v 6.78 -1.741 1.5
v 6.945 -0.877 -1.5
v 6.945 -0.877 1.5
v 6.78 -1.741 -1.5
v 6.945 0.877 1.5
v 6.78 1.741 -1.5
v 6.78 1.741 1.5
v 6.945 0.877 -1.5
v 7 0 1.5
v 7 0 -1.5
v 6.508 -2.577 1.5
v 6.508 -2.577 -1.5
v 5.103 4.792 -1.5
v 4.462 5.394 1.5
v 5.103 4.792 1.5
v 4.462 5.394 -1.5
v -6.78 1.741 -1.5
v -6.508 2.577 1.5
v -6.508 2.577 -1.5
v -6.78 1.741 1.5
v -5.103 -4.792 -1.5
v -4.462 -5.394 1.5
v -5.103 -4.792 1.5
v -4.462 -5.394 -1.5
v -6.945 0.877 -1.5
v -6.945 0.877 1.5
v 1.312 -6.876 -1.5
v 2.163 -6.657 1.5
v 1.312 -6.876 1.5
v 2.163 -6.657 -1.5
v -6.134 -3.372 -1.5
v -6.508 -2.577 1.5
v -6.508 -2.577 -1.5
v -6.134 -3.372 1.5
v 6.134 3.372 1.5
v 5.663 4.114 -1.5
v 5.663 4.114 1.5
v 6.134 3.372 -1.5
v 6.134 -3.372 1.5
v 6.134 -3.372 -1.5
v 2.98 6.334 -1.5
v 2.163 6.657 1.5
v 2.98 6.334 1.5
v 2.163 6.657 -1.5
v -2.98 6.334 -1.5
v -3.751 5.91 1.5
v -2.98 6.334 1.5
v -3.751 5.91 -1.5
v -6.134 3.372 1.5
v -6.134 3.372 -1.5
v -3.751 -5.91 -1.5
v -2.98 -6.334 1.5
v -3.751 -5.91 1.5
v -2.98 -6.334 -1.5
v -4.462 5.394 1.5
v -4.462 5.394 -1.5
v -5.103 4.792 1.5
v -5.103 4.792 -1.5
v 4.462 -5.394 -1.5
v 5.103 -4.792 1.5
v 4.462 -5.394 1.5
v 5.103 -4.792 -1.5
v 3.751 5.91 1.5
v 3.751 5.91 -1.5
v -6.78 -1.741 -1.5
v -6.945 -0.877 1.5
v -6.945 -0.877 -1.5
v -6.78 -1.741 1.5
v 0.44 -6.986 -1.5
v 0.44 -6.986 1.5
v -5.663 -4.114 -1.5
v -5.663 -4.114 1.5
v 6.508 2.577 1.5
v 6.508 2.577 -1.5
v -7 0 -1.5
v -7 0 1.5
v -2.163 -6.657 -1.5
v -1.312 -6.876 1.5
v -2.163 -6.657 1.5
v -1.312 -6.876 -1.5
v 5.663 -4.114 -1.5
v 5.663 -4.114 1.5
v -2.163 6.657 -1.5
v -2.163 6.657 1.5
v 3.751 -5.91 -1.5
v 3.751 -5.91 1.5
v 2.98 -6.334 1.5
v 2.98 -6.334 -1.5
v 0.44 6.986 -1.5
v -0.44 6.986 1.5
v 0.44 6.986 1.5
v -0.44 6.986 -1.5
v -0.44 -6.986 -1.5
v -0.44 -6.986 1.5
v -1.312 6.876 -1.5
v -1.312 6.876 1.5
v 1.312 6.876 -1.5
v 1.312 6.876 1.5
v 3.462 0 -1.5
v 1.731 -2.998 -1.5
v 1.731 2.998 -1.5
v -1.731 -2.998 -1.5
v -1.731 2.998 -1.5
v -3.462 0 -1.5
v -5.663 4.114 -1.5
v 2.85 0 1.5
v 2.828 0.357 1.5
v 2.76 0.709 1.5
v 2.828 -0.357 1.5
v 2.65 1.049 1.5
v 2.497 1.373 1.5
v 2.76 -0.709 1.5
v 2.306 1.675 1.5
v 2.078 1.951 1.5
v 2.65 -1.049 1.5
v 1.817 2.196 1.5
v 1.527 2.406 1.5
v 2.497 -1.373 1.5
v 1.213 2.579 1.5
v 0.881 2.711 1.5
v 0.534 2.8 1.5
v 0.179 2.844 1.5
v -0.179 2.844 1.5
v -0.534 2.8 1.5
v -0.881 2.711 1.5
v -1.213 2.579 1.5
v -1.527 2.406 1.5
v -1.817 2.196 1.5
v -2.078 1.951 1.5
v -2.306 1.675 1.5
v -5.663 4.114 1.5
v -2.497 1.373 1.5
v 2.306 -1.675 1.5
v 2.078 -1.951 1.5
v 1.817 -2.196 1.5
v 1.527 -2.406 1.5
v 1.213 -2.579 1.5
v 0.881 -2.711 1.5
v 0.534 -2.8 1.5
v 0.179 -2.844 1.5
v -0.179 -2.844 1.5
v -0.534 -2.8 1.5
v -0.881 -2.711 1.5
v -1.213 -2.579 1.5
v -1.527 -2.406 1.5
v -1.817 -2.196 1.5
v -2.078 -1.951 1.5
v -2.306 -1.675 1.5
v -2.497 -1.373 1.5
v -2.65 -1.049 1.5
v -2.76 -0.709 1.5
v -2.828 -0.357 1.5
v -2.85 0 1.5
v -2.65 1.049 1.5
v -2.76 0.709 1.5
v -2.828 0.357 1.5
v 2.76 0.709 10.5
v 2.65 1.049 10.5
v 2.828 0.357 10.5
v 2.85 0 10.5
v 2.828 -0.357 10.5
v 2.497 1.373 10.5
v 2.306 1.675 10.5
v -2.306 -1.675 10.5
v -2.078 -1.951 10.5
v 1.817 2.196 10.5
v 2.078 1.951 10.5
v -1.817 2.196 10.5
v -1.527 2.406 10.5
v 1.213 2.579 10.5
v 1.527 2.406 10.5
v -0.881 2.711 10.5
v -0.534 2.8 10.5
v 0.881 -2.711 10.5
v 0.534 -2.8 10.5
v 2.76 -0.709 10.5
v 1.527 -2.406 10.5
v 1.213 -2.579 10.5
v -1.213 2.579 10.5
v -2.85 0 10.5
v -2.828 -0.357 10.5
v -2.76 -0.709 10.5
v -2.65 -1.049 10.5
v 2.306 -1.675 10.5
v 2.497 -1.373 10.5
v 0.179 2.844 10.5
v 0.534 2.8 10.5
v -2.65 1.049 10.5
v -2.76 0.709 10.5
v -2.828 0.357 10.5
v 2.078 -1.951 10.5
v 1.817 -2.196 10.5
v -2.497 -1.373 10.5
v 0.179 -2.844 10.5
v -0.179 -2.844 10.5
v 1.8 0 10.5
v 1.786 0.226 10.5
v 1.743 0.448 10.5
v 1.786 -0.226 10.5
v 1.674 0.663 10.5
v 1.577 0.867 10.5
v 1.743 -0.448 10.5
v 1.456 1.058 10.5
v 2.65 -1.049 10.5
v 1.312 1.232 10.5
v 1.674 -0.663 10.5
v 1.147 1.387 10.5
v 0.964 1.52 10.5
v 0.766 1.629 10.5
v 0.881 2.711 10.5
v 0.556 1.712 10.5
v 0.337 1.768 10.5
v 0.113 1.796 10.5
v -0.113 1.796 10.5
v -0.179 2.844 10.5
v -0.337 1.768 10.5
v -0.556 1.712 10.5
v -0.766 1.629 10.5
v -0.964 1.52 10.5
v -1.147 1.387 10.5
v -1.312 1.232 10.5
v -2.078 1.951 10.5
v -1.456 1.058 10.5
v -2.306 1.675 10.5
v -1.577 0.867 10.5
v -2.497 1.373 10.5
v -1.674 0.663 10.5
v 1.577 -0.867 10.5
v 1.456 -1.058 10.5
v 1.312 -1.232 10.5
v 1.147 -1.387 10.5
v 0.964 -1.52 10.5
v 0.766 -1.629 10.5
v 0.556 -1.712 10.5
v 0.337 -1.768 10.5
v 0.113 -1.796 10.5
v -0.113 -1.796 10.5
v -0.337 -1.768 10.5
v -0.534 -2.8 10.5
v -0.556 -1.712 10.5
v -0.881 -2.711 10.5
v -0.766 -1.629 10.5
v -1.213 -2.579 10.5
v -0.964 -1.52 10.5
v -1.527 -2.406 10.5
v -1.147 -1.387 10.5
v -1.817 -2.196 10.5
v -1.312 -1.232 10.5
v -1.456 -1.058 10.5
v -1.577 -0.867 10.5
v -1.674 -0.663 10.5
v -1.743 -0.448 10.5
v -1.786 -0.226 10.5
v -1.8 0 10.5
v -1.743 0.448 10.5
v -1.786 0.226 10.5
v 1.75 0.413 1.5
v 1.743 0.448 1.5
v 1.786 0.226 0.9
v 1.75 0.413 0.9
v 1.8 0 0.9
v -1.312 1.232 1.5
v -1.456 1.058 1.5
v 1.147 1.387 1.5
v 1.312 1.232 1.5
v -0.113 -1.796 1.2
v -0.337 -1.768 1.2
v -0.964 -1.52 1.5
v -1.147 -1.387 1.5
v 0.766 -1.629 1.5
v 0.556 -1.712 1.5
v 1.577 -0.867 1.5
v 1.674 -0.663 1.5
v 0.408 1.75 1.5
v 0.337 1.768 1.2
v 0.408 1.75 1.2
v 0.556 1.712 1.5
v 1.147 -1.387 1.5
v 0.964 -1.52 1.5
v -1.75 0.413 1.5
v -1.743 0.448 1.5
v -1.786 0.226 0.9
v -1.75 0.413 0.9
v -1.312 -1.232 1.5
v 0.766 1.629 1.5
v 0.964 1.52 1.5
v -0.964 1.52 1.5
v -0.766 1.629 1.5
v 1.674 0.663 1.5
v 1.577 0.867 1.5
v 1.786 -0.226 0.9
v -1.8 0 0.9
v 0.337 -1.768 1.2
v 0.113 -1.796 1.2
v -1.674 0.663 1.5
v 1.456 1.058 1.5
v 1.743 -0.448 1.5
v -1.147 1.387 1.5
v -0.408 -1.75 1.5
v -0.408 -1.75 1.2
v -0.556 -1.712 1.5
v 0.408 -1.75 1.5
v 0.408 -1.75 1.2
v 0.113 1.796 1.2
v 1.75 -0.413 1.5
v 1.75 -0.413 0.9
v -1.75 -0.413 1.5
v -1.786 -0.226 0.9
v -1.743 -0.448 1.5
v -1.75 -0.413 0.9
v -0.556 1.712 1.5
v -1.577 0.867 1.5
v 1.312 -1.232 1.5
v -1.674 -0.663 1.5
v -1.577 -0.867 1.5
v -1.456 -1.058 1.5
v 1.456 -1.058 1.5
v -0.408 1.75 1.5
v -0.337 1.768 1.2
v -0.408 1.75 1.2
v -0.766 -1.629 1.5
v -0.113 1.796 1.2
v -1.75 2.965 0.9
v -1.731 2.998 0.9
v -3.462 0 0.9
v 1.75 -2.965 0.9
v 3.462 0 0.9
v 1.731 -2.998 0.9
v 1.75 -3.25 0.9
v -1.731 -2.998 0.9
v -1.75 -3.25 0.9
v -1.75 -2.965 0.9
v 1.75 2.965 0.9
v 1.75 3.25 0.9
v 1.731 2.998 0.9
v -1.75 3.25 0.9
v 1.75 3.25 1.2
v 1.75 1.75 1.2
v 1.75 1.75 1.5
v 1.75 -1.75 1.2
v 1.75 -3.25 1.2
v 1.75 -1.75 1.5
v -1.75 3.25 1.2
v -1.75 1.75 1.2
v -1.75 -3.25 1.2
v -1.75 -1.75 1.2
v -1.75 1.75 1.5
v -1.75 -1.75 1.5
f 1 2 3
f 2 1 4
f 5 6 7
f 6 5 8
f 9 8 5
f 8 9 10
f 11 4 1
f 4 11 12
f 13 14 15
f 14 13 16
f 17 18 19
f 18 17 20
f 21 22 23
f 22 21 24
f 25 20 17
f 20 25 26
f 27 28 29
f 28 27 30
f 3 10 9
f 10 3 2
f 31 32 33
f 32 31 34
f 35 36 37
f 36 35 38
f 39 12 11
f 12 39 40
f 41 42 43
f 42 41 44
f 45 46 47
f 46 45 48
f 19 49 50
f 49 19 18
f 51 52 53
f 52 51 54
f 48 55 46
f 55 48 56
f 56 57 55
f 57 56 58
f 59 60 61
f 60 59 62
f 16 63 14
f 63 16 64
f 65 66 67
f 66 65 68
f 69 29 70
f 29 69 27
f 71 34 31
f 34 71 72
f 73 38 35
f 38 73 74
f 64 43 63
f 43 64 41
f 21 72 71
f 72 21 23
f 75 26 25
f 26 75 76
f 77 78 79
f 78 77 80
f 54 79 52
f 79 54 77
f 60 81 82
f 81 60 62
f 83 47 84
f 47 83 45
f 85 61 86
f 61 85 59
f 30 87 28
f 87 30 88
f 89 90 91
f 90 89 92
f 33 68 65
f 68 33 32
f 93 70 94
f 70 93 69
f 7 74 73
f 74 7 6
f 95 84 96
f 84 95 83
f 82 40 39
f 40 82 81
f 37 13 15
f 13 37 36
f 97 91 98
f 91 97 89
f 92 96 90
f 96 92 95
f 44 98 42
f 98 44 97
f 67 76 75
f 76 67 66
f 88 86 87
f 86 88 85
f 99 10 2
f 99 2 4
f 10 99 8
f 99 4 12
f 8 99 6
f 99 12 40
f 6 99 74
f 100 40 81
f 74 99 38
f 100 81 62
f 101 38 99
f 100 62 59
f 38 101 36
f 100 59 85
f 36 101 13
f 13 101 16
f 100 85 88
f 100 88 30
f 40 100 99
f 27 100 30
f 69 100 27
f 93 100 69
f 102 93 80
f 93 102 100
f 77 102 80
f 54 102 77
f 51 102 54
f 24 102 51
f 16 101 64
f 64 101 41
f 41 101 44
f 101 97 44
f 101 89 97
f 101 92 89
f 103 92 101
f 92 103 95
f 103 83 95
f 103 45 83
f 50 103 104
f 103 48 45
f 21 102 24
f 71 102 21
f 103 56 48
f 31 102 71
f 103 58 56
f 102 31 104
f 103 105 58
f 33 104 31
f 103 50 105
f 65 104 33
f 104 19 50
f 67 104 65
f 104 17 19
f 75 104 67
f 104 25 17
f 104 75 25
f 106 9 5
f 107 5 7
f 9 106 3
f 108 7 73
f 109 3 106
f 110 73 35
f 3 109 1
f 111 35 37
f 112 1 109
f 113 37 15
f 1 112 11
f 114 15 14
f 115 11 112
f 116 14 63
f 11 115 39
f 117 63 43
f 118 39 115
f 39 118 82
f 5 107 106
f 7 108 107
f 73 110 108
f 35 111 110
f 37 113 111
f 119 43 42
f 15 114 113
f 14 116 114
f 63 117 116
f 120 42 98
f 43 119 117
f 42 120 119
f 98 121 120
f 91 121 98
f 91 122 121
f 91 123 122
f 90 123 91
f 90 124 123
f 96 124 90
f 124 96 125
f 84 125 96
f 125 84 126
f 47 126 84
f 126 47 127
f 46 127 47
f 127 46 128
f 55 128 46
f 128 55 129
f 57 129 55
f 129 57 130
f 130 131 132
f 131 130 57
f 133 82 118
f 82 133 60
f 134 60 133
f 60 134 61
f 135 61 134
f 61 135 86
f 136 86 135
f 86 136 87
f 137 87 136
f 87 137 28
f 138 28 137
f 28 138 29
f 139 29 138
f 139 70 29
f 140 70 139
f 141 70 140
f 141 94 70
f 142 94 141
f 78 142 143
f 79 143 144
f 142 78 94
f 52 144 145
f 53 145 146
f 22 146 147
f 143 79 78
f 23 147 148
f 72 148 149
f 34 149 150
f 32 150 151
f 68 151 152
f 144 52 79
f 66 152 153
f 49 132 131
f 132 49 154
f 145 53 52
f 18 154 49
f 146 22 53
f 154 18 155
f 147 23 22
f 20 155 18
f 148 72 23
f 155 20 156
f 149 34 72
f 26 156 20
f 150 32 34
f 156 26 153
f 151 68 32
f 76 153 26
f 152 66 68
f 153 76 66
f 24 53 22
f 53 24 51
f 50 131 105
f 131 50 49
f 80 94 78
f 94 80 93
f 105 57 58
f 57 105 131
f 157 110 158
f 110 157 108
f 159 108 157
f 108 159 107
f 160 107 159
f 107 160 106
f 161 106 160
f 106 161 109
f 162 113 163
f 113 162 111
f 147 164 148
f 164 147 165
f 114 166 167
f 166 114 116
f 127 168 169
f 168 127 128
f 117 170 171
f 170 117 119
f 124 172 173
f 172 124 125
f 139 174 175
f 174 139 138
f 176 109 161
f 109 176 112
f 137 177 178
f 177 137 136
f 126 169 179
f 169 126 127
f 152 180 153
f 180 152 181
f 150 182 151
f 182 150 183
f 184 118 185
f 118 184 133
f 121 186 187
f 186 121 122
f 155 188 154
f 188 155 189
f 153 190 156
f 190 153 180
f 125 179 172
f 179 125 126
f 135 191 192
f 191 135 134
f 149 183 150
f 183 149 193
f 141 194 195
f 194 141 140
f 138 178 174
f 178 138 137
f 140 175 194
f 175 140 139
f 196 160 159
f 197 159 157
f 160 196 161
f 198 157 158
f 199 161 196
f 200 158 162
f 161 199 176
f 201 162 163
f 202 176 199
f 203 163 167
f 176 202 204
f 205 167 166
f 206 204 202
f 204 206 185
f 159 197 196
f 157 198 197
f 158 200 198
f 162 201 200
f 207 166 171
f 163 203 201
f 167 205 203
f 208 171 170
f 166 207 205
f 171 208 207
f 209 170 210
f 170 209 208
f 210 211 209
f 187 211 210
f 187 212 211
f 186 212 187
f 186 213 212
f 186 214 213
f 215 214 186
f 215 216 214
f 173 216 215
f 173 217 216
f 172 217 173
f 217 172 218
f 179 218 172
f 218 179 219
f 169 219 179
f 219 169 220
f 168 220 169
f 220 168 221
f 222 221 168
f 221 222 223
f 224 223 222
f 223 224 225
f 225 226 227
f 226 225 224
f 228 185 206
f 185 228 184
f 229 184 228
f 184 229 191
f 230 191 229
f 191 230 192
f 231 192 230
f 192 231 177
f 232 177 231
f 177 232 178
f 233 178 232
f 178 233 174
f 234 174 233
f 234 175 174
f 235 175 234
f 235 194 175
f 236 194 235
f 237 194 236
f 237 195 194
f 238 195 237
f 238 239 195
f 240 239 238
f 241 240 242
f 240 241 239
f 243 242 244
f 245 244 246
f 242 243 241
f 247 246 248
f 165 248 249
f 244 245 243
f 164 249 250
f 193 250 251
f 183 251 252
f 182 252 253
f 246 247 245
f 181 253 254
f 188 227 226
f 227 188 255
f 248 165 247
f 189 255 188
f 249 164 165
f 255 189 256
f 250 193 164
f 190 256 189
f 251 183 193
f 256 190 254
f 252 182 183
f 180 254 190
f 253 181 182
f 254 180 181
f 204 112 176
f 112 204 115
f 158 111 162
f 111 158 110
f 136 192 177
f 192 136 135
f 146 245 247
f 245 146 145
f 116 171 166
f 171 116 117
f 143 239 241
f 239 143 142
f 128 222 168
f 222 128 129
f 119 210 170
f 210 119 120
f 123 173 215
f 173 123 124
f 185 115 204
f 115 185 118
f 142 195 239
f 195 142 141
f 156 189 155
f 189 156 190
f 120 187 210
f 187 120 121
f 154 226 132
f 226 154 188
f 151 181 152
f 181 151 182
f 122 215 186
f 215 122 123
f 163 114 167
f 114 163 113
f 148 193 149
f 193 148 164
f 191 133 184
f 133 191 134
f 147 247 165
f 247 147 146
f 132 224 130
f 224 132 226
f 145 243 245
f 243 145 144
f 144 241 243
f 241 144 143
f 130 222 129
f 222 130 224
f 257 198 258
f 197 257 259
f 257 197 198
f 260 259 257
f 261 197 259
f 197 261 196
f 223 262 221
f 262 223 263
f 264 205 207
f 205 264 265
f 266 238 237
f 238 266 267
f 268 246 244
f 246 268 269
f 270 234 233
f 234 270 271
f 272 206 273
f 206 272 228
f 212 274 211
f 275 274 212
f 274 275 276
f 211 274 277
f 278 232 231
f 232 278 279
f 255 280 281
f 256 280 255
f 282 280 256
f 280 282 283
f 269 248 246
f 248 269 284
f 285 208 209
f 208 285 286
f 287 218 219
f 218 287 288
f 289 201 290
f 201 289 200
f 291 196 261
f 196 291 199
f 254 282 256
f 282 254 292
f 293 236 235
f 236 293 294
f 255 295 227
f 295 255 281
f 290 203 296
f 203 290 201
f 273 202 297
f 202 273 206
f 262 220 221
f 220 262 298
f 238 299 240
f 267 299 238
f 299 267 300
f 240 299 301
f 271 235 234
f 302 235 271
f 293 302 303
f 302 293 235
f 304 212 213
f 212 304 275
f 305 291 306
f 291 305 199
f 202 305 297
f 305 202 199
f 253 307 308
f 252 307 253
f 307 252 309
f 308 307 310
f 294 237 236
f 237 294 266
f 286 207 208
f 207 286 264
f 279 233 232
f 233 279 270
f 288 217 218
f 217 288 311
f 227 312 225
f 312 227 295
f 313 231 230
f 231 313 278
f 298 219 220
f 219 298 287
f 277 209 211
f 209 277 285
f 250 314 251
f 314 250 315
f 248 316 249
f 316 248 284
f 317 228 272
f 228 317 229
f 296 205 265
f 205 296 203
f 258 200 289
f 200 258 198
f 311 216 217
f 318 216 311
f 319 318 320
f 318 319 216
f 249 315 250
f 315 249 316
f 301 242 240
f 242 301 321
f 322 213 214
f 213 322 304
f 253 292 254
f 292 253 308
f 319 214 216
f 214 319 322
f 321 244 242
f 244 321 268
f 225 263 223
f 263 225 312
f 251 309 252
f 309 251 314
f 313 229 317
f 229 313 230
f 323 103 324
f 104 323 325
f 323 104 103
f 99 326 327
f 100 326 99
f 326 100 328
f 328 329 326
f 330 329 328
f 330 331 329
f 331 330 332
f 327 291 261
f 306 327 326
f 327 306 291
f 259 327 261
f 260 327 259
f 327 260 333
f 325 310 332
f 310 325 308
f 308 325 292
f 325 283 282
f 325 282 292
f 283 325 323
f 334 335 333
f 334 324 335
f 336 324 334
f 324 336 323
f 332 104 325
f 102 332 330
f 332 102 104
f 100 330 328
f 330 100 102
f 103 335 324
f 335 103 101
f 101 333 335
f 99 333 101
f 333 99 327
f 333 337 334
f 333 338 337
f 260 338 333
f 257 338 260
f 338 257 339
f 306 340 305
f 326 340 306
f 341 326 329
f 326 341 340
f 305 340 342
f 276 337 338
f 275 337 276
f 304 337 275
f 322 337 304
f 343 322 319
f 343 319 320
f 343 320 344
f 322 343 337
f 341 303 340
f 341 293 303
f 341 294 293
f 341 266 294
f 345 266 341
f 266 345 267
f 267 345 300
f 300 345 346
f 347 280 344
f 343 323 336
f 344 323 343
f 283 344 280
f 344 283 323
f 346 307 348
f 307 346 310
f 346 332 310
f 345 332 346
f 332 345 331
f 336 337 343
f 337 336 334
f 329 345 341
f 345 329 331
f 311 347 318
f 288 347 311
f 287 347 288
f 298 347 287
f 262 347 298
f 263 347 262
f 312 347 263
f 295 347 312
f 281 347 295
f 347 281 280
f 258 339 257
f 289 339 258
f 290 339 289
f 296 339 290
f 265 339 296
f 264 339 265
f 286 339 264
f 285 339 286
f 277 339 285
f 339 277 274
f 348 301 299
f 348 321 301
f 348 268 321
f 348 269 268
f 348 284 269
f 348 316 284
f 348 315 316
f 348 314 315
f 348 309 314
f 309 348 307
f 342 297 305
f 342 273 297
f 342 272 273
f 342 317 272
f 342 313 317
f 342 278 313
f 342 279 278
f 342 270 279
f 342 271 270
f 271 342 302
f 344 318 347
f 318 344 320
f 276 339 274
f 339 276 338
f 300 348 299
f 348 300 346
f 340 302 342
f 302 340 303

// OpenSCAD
$fn = 50;


difference() {
	union() {
		translate(v = [0, 0, -1.5000000000]) {
			rotate(a = [0, 0, 0]) {
				cylinder(h = 3, r = 7.0000000000);
			}
		}
		translate(v = [0, 0, -1.5000000000]) {
			rotate(a = [0, 0, 0]) {
				cylinder(h = 12, r = 2.8500000000);
			}
		}
	}
	union() {
		translate(v = [0, 0, -125.0000000000]) {
			rotate(a = [0, 0, 0]) {
				cylinder(h = 250, r = 1.8000000000);
			}
		}
		translate(v = [0, 0, -2.1000000000]) {
			rotate(a = [0, 0, 0]) {
				#translate(v = [0, 0, 0]) {
					rotate(a = [0, 0, 0]) {
						linear_extrude(height = 3) {
							polygon(points = [[3.4620000000, 0.0000000000], [1.7310000000, 2.9981799479], [-1.7310000000, 2.9981799479], [-3.4620000000, 0.0000000000], [-1.7310000000, -2.9981799479], [1.7310000000, -2.9981799479]]);
						}
					}
				}
			}
		}
		#translate(v = [-1.7500000000, -3.2500000000, 0.9000000000]) {
			rotate(a = [0, 0, 0]) {
				cube(size = [3.5000000000, 6.5000000000, 0.3000000000]);
			}
		}
		#translate(v = [-1.7500000000, -1.7500000000, 1.2000000000]) {
			rotate(a = [0, 0, 0]) {
				cube(size = [3.5000000000, 3.5000000000, 0.3000000000]);
			}
		}
		#translate(v = [-1.7500000000, -3.2500000000, -2.4000000000]) {
			rotate(a = [0, 0, 0]) {
				cube(size = [3.5000000000, 6.5000000000, 0.3000000000]);
			}
		}
		#translate(v = [-1.7500000000, -1.7500000000, -2.7000000000]) {
			rotate(a = [0, 0, 0]) {
				cube(size = [3.5000000000, 3.5000000000, 0.3000000000]);
			}
		}
	}
}
